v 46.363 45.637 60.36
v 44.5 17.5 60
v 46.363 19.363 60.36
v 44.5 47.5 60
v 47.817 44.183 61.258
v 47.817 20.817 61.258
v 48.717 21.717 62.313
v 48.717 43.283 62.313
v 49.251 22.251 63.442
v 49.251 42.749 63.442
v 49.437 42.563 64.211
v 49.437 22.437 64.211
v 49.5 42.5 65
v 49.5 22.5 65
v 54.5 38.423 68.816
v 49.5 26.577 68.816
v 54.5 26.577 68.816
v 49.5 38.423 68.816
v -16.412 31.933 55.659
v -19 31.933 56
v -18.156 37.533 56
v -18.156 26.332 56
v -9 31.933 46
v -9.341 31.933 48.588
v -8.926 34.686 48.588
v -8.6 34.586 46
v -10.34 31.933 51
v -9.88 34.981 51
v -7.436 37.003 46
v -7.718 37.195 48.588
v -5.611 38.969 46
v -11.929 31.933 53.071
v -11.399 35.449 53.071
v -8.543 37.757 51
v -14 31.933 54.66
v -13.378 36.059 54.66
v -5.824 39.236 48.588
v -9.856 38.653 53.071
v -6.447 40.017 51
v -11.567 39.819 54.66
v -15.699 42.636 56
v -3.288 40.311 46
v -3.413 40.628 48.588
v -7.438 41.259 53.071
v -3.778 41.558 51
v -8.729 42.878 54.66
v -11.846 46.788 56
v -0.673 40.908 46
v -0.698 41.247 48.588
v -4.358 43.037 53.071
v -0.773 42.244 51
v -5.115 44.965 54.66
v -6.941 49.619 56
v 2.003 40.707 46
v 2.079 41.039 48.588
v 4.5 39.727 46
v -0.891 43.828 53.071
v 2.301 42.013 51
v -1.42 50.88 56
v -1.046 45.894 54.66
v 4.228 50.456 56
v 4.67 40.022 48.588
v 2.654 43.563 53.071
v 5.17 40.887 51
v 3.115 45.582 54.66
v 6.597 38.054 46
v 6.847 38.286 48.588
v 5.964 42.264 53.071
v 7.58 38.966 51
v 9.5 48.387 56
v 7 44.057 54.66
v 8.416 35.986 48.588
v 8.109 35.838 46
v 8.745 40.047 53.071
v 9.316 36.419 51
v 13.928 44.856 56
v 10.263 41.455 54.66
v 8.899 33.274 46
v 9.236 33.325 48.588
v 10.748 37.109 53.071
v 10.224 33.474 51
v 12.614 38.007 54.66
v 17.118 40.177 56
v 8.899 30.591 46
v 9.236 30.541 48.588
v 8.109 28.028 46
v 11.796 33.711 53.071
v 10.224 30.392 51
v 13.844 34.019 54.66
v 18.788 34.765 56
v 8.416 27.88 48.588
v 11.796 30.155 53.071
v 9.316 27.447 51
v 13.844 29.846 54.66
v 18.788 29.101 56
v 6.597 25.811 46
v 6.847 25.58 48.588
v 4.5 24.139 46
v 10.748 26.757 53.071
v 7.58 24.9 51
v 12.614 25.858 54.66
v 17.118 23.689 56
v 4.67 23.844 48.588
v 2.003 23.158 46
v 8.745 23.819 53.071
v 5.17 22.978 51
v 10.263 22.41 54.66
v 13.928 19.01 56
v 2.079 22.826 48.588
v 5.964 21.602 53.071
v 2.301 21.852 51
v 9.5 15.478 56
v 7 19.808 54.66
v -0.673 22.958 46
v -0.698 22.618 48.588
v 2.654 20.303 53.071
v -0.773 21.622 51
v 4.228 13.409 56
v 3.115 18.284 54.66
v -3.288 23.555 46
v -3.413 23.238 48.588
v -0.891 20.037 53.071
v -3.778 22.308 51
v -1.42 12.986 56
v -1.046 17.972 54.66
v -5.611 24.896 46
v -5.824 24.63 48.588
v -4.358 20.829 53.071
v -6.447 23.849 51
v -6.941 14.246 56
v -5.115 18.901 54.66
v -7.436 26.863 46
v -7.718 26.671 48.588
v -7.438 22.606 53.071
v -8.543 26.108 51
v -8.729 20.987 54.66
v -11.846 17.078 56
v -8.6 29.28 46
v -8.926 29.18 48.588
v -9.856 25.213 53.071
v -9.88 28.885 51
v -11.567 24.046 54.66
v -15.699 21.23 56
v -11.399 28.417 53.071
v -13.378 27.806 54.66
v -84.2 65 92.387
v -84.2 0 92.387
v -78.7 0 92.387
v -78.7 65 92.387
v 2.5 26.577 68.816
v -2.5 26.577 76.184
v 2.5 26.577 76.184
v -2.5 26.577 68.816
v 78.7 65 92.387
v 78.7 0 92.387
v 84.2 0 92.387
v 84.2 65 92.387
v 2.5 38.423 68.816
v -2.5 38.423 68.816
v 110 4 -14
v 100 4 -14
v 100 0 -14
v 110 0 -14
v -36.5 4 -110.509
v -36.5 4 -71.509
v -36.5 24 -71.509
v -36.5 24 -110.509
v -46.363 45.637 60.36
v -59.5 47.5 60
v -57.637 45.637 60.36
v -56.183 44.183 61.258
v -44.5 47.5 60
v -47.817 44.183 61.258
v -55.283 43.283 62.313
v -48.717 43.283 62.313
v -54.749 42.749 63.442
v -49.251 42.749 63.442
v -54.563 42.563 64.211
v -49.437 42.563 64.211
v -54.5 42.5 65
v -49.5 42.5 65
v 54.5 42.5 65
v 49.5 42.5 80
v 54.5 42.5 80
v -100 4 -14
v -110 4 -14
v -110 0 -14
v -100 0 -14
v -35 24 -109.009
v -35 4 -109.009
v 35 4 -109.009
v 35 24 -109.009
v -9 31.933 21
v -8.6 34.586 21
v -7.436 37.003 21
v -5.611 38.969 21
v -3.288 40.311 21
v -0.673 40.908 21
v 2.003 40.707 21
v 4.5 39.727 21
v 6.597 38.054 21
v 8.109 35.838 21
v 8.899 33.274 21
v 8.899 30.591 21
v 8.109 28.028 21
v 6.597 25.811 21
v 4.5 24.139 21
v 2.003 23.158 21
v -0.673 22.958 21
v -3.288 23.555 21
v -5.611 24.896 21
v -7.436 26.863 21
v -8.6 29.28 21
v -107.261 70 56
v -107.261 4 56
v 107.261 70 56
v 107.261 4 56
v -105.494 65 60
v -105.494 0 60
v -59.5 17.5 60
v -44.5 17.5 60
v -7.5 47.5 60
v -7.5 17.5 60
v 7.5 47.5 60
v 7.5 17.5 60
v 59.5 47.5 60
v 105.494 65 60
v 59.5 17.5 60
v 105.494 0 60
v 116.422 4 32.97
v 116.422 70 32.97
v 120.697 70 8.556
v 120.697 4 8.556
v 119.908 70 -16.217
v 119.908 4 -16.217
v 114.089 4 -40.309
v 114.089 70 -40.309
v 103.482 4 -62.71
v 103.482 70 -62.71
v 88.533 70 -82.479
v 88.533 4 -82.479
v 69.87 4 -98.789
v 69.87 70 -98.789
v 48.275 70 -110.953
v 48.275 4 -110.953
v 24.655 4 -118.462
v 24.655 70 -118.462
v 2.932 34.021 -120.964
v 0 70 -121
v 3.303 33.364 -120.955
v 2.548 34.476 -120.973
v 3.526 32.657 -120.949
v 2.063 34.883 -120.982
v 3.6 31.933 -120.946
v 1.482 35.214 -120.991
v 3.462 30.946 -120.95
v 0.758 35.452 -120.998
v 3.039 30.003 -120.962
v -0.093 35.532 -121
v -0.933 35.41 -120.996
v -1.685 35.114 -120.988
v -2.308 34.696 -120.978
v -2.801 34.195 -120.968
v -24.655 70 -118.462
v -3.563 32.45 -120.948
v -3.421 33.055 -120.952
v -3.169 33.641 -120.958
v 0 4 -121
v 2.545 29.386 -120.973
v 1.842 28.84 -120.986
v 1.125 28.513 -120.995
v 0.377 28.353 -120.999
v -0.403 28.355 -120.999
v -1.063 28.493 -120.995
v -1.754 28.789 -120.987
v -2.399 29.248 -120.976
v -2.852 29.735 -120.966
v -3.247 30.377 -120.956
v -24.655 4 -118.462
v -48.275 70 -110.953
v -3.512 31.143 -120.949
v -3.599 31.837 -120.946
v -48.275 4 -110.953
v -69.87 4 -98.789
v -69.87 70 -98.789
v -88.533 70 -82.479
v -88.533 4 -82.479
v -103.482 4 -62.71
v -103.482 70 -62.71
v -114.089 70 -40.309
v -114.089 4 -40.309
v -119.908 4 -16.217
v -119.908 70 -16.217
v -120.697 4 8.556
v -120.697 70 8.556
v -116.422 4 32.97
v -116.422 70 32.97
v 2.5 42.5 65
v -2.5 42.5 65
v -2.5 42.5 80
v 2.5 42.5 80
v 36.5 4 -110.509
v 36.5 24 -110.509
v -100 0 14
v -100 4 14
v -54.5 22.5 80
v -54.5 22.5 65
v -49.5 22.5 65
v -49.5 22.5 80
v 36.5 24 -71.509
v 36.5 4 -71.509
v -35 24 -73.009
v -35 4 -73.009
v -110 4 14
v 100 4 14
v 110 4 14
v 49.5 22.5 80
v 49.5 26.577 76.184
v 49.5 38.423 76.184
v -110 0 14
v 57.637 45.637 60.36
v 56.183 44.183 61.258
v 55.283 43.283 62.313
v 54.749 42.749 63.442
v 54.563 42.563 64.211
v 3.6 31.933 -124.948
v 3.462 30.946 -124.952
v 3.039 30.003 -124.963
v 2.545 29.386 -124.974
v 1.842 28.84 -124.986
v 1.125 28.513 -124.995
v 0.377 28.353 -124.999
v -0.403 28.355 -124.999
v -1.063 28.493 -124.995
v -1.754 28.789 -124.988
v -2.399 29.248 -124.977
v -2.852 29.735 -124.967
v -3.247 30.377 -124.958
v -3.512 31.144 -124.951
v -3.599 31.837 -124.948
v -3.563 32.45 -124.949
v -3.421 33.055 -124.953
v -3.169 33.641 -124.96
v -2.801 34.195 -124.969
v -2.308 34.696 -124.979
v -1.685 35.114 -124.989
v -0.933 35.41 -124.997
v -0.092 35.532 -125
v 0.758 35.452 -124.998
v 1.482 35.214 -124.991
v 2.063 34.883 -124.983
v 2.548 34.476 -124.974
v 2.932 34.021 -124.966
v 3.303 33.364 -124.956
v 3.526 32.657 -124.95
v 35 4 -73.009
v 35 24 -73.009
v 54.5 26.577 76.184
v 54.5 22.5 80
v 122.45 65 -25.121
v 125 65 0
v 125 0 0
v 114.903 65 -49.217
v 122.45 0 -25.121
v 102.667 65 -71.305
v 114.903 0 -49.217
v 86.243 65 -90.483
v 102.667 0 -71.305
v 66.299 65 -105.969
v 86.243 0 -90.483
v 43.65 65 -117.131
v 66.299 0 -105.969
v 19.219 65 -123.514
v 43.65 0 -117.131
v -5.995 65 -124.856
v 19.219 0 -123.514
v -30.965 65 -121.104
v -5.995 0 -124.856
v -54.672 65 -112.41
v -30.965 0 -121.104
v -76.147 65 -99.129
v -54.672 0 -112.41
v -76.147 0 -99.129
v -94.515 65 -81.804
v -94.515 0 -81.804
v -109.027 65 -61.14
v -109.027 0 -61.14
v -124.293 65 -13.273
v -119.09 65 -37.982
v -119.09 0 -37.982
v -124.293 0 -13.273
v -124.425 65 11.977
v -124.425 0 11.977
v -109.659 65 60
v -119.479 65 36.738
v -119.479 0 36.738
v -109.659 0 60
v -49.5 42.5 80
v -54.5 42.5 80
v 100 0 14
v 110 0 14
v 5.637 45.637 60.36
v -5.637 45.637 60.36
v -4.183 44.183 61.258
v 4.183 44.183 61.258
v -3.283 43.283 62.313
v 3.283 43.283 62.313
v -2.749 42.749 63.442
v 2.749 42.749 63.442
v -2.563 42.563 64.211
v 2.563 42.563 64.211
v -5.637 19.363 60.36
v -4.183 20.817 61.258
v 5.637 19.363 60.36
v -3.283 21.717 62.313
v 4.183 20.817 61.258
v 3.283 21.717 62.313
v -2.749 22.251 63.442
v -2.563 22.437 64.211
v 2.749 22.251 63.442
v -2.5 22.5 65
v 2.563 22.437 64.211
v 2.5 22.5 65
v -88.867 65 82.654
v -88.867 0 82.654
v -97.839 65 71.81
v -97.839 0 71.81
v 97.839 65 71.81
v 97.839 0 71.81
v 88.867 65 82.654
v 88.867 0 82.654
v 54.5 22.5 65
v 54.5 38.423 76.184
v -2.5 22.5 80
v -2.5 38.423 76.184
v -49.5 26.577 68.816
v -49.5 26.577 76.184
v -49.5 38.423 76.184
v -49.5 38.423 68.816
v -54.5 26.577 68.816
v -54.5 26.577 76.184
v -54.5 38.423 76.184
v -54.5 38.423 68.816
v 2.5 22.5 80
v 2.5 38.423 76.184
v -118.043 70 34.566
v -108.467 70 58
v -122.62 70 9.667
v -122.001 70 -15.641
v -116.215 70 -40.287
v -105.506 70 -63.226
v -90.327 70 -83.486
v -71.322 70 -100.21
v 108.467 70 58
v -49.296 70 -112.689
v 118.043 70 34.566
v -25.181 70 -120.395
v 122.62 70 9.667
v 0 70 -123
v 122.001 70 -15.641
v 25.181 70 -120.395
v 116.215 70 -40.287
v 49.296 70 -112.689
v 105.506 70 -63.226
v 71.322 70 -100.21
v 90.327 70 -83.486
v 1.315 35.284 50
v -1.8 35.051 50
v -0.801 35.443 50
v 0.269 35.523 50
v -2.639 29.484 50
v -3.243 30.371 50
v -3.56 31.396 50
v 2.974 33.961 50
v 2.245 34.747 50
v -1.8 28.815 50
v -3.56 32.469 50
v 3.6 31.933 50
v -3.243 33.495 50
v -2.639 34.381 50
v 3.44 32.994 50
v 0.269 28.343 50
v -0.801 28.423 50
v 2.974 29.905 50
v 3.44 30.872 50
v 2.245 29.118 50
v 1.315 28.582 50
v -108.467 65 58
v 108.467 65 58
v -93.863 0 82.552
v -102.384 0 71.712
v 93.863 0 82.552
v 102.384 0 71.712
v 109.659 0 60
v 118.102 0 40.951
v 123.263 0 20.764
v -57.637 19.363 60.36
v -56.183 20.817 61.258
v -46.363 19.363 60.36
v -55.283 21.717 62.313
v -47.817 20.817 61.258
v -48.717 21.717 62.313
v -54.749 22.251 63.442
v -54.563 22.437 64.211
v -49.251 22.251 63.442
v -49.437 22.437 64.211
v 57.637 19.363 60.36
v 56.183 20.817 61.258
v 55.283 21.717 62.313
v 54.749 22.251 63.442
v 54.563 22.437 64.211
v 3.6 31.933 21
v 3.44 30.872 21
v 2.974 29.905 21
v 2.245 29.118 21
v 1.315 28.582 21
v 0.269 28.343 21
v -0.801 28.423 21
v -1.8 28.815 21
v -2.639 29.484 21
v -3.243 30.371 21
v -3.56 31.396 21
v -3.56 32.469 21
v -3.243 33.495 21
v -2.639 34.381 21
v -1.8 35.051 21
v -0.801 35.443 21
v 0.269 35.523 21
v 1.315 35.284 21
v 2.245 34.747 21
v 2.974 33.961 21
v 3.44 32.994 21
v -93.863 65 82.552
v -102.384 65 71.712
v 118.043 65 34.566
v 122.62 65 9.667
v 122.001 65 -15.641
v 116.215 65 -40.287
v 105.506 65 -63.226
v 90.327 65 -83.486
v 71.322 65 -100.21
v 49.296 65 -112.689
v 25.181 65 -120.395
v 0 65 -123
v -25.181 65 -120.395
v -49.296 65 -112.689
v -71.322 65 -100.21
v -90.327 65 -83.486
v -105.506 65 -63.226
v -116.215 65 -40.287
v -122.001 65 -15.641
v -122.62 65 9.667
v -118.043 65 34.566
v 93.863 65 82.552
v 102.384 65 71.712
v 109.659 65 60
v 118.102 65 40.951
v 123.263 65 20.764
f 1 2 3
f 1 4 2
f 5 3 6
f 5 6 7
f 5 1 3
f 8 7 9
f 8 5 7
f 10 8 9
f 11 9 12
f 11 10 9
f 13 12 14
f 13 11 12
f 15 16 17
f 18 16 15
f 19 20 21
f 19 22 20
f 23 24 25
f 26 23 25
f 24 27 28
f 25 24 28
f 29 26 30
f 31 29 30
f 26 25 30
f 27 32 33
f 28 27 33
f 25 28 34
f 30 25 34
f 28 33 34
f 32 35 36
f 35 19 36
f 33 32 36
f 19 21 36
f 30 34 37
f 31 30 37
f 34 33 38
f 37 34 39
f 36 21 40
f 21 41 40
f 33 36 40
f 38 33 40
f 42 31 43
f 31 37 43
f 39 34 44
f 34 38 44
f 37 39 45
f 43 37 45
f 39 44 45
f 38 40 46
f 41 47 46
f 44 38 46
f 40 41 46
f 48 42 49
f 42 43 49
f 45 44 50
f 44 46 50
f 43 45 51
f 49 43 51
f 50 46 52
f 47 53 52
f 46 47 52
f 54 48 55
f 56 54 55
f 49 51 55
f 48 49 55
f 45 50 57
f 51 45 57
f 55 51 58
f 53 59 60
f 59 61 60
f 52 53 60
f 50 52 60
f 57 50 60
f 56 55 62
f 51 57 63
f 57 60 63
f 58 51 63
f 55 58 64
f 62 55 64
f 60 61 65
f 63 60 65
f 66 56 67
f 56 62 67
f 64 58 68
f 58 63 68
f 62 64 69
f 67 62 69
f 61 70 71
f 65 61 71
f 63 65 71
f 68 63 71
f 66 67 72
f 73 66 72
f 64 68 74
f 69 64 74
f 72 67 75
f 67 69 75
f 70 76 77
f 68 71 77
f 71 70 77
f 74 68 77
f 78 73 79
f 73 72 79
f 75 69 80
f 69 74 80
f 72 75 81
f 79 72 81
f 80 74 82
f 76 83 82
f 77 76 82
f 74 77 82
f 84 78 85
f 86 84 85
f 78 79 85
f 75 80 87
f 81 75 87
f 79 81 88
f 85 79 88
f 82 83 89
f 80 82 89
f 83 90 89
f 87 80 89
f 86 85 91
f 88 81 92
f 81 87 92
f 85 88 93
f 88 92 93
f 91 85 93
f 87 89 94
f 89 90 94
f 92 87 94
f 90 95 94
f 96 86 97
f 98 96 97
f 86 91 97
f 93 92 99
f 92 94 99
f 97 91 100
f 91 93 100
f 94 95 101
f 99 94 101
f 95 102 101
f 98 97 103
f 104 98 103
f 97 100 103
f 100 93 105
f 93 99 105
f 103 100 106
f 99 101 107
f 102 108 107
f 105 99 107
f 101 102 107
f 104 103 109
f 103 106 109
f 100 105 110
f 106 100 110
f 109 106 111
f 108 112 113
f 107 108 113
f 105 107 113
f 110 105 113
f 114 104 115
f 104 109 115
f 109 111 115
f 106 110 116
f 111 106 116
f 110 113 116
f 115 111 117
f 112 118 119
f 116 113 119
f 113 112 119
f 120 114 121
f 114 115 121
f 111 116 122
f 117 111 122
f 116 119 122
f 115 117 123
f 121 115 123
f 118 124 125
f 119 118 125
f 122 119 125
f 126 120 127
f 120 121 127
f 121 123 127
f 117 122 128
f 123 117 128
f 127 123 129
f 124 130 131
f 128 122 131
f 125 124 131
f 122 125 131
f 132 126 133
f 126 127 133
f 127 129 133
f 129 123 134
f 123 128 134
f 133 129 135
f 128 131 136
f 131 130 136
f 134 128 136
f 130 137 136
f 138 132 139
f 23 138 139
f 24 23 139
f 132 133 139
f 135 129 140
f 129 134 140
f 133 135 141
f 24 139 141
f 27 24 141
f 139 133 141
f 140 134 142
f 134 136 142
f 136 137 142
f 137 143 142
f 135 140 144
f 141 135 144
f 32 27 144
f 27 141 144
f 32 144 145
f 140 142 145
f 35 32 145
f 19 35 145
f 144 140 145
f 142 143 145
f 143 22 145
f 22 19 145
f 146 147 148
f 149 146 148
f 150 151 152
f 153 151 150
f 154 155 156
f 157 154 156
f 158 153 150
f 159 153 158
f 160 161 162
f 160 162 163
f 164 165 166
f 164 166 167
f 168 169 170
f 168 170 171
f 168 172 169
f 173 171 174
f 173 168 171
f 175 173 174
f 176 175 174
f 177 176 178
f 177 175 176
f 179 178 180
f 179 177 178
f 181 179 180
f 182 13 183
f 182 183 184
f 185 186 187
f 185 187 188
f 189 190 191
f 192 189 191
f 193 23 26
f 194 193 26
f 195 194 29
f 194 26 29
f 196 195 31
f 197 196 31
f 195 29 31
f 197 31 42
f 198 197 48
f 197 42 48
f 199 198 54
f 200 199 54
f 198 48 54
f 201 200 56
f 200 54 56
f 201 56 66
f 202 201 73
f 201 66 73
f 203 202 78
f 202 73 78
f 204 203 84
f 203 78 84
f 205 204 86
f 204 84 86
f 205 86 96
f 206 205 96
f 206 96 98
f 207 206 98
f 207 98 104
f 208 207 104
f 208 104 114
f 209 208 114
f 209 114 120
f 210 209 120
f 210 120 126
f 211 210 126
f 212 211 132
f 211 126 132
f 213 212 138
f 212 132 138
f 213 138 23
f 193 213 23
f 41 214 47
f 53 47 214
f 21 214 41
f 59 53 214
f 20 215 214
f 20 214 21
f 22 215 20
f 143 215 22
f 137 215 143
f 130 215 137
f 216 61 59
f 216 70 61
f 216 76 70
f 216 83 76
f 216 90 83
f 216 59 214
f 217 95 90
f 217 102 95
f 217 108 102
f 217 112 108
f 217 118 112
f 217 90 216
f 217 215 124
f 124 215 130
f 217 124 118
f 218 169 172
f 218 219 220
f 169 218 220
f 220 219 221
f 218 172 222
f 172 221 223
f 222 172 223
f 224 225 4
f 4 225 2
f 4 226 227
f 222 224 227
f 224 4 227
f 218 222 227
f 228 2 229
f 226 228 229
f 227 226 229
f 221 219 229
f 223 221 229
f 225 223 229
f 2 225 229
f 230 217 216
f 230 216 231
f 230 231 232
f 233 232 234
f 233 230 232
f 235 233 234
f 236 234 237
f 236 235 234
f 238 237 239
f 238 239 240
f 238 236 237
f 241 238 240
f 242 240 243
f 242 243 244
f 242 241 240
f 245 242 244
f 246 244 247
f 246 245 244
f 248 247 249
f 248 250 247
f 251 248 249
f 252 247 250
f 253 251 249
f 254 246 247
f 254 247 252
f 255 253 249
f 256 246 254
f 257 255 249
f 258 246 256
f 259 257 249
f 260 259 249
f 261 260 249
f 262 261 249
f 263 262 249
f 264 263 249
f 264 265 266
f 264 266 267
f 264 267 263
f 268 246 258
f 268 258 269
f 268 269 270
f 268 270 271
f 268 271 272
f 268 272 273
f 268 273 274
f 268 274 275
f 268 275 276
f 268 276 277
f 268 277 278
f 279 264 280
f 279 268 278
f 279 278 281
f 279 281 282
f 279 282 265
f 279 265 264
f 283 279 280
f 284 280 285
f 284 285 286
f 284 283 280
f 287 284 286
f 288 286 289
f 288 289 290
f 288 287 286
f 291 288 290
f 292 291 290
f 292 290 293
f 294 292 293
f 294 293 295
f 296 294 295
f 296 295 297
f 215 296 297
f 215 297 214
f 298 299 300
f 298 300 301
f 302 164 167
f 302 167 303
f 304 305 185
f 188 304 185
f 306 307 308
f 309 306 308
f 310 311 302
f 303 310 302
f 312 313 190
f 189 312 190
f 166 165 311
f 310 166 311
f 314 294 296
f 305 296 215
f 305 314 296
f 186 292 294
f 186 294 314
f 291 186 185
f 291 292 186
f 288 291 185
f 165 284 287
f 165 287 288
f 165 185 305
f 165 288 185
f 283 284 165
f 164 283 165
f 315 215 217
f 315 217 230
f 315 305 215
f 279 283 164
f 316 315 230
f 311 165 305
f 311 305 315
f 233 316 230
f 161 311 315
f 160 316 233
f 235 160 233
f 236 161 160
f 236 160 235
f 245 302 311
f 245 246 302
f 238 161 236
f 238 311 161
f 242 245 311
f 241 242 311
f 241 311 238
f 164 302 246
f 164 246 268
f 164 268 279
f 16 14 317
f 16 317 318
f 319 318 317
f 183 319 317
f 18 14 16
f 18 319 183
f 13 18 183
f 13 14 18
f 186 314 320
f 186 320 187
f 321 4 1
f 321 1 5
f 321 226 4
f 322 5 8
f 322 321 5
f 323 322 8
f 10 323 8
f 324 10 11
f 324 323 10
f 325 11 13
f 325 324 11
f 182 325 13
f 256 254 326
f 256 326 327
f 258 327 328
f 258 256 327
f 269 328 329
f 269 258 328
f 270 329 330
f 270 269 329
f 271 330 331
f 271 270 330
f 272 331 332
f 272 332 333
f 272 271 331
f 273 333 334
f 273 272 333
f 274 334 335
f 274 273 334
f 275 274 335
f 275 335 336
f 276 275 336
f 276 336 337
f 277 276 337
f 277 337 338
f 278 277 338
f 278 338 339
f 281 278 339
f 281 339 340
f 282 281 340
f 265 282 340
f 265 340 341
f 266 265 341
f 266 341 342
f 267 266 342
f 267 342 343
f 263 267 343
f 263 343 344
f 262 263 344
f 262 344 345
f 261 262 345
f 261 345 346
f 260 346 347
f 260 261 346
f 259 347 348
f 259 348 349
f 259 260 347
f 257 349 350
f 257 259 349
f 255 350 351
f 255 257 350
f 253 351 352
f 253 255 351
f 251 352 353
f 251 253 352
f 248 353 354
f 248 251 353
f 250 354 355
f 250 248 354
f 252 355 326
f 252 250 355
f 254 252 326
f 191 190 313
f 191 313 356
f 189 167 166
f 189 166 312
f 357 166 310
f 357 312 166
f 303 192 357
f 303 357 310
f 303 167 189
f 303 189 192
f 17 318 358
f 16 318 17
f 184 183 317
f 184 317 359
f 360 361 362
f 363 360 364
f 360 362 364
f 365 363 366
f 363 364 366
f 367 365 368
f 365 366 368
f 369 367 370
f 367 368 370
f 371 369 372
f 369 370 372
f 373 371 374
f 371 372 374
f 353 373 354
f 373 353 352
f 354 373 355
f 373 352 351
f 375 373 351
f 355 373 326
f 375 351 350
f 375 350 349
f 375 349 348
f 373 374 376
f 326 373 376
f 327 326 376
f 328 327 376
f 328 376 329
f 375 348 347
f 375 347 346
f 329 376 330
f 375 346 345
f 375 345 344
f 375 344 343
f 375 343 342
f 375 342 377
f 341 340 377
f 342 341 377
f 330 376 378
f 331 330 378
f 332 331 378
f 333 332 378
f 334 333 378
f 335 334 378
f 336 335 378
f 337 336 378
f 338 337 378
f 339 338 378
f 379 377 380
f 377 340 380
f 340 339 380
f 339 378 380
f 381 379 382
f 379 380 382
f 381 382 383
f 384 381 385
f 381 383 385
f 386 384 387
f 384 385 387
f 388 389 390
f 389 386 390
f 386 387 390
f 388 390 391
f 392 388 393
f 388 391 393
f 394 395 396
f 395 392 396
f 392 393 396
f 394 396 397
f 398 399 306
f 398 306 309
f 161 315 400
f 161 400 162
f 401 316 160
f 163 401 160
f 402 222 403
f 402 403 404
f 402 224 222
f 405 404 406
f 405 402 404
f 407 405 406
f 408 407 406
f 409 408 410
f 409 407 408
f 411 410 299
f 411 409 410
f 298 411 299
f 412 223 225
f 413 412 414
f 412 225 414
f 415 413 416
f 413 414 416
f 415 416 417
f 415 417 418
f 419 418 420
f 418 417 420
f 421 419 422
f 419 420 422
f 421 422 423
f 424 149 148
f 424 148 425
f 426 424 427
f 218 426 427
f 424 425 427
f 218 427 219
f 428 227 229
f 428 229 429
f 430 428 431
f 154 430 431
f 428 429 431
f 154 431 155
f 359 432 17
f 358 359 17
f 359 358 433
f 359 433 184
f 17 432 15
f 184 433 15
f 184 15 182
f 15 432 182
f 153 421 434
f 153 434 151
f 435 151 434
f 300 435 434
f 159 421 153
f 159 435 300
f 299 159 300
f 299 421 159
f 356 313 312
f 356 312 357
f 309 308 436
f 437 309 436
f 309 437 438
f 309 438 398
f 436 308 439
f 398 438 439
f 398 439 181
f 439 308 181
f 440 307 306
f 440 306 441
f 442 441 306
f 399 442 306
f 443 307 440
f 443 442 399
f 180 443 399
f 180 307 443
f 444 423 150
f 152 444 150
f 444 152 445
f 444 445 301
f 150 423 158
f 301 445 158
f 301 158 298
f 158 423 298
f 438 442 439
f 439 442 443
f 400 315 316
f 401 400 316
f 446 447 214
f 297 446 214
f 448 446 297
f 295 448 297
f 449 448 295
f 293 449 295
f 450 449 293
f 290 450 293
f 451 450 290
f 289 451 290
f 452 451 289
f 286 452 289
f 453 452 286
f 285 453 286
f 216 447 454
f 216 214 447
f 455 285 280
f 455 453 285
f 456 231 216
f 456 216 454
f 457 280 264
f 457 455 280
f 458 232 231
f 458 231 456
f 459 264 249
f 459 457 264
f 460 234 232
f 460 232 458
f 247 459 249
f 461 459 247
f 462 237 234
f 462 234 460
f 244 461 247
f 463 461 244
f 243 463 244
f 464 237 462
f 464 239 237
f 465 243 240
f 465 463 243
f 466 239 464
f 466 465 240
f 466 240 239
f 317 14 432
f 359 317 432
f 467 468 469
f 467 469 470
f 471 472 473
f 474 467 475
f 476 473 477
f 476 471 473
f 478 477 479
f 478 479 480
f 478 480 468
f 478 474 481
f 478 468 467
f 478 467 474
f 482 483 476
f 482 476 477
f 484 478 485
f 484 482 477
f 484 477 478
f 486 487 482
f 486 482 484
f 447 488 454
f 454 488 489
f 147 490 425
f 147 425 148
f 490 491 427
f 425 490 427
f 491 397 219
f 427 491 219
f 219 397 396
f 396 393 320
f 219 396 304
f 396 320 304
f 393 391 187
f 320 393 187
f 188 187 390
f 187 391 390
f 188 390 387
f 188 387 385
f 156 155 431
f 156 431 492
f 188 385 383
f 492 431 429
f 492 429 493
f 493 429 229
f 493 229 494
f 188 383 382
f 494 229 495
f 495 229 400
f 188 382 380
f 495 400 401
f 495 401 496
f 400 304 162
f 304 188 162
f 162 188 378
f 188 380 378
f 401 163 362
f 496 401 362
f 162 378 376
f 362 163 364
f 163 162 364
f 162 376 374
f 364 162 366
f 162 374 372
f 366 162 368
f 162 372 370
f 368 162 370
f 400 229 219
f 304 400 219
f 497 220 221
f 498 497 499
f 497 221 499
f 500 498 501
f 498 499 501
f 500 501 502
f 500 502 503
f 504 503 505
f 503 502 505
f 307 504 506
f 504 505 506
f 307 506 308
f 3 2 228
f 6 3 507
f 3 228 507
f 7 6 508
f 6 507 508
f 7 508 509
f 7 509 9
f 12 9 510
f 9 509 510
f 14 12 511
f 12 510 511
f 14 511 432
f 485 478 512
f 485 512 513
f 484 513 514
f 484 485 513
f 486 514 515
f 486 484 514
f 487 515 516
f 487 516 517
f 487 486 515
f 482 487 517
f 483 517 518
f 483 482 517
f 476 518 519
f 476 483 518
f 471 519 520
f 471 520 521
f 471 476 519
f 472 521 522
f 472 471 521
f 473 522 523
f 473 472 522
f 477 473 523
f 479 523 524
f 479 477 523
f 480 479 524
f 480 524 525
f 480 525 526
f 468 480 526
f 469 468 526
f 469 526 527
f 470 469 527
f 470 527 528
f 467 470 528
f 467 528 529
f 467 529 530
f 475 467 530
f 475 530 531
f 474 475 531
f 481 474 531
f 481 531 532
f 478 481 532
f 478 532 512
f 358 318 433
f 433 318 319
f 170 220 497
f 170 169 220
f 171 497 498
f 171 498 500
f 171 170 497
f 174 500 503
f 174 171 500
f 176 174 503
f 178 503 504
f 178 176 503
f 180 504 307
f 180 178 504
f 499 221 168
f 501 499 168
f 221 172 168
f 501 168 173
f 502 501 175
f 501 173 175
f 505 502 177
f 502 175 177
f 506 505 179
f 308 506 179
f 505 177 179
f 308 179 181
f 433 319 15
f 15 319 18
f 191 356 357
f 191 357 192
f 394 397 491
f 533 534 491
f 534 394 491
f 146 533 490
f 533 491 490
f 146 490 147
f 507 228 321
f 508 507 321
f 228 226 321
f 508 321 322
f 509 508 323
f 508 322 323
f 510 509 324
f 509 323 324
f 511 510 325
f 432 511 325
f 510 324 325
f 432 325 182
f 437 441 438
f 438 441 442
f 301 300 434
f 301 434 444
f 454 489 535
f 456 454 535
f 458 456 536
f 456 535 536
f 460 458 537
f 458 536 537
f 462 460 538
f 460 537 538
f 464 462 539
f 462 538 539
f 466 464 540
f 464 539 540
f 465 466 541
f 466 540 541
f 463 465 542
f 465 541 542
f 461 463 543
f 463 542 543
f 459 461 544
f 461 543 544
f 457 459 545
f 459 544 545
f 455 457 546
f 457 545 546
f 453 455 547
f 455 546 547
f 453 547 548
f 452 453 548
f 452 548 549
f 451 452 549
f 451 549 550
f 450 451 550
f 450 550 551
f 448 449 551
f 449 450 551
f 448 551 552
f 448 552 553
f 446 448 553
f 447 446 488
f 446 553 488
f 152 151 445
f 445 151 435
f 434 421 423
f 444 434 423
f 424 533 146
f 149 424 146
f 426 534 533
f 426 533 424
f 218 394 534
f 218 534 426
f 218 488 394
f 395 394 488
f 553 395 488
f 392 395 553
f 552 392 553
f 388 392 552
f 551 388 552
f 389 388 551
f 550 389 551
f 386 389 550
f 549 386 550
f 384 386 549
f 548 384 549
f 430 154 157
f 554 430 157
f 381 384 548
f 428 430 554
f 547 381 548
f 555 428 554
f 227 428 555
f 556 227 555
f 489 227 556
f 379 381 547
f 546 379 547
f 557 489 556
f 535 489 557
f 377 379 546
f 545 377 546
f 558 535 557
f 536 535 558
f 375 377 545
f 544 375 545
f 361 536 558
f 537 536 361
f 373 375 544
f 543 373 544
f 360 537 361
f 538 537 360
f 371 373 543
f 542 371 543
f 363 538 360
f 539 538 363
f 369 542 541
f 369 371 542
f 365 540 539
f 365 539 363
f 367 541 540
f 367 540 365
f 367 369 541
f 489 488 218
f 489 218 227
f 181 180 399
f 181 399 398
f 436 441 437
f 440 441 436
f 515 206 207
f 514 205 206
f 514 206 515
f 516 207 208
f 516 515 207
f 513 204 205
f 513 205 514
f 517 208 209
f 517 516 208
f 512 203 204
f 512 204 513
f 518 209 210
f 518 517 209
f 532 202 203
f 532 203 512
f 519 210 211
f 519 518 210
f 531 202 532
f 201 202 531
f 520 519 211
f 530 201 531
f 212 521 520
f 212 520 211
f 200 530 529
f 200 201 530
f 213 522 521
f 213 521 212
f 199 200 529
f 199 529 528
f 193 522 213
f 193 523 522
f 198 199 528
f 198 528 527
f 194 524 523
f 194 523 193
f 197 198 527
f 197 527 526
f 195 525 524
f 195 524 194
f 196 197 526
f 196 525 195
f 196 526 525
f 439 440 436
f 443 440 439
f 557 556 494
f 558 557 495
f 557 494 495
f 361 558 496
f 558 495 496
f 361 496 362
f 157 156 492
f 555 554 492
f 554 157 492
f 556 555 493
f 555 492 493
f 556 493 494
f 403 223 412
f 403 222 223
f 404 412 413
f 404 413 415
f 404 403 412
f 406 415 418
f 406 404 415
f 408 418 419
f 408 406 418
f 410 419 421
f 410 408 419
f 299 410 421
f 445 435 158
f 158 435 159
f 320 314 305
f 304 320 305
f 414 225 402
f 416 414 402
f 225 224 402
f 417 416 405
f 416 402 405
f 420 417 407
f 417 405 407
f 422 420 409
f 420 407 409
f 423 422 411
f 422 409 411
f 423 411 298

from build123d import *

# Parameters (mm, degrees)
RESSALTO_EXTRUS_O1_DEPTH   = 70
RESSALTO_EXTRUS_O4_START   = -70
RESSALTO_EXTRUS_O4_DEPTH   = 70
CASCA1_START               = 4
CASCA1_DEPTH               = 66
ESBO_O17_W                 = 10
ESBO_O17_H                 = 28
CORTE_EXTRUS_O2_DEPTH      = 10
CORTE_EXTRUS_O6_DEPTH      = 4
CORTE_EXTRUS_O6_DEPTH_BACK = 5
ESBO_O23_OUTSIDE_W         = 319.722
ESBO_O23_OUTSIDE_H         = 287.109
ESBO_O27_W                 = 5
ESBO_O27_H                 = 20
RESSALTO_EXTRUS_O5_DEPTH   = 20
FILETE2_R                  = 5
CORTE_EXTRUS_O7_DEPTH      = 104
CORTE_EXTRUS_O7_DEPTH_BACK = 5
ESBO_O28_W                 = 7.367994206
ESBO_O28_H                 = 11.845430552
ESBO_O32_R                 = 3.6
CORTE_EXTRUS_O8_DEPTH      = 187
ESBO_O32_3_R               = 9
ESBO_O32_3_R_2             = 3.6
RESSALTO_EXTRUS_O6_DEPTH   = 35
ESBO_O32_4_R               = 3.6
RESSALTO_EXTRUS_O7_DEPTH   = 6
FILETE3_R                  = 10
ESBO_O24_W                 = 73
ESBO_O24_H                 = 39
ESBO_O24_W_2               = 70
ESBO_O24_H_2               = 36
RESSALTO_EXTRUS_O8_DEPTH   = 20


# Read off the part's stored shape, not the designer's step: Casca1
with BuildPart() as part:
    # Esboço1 → Ressalto-extrusão1 (new body)
    with BuildSketch(Plane(origin=(0, 0, 0), x_dir=(1, 0, 0), z_dir=(0, 1, 0))):
        with BuildLine():
            ThreePointArc((125, 0), (-30.965140685, 121.103922572), (-109.658560997, -60))
            Line((-109.658560997, -60), (109.658560997, -60))
            ThreePointArc((109.658560997, -60), (121.103922572, -30.965140685), (125, 0))
        make_face()
    extrude(amount=RESSALTO_EXTRUS_O1_DEPTH)

    # Esboço5 → Ressalto-extrusão4 (add)
    with BuildSketch(Plane(origin=(0, 70, 0), x_dir=(1, 0, 0), z_dir=(0, 1, 0)).offset(RESSALTO_EXTRUS_O4_START)):
        with BuildLine():
            Line((-84.200220254, -92.386811338), (-78.700220254, -92.386811338))
            ThreePointArc((-78.700220254, -92.386811338), (-93.51006265, -77.362237302), (-105.49430116, -60))
            Line((-105.49430116, -60), (-109.658560997, -60))
            ThreePointArc((-109.658560997, -60), (-98.272748787, -77.249380877), (-84.200220254, -92.386811338))
        make_face()
        with BuildLine():
            Line((78.700220254, -92.386811338), (84.200220254, -92.386811338))
            ThreePointArc((84.200220254, -92.386811338), (98.272748787, -77.249380877), (109.658560997, -60))
            Line((109.658560997, -60), (105.49430116, -60))
            ThreePointArc((105.49430116, -60), (93.51006265, -77.362237302), (78.700220254, -92.386811338))
        make_face()
    extrude(amount=RESSALTO_EXTRUS_O4_DEPTH)

    # Casca1 outline → Casca1 (cut)
    with BuildSketch(Plane(origin=(0, 0, 0), x_dir=(1, 0, 0), z_dir=(0, 1, 0)).offset(CASCA1_START)):
        with BuildLine():
            Line((-107.261363034, -56), (107.261363034, -56))
            ThreePointArc((107.261363034, -56), (0, 121), (-107.261363034, -56))
        make_face()
    extrude(amount=CASCA1_DEPTH, mode=Mode.SUBTRACT)

    # Esboço17 → Corte-extrusão2 (cut)
    with BuildSketch(Plane(origin=(0, 4, 0), x_dir=(1, 0, 0), z_dir=(0, 1, 0))):
        with Locations((-105, 0)):
            Rectangle(ESBO_O17_W, ESBO_O17_H)
        with Locations((105, 0)):
            Rectangle(ESBO_O17_W, ESBO_O17_H)
    extrude(amount=-CORTE_EXTRUS_O2_DEPTH, mode=Mode.SUBTRACT)

    # Esboço23 outside → Corte-extrusão6 (cut, two sides: drawn at the far end of the back side and taken through both)
    with BuildSketch(Plane(origin=(0, 70, 0), x_dir=(1, 0, 0), z_dir=(0, 1, 0)).offset(-CORTE_EXTRUS_O6_DEPTH_BACK)):
        with Locations((0, 16.3065)):
            Rectangle(ESBO_O23_OUTSIDE_W, ESBO_O23_OUTSIDE_H)
        with BuildLine():
            Line((-108.466584716, -58), (108.466584716, -58))
            ThreePointArc((108.466584716, -58), (0, 123), (-108.466584716, -58))
        make_face(mode=Mode.SUBTRACT)
    extrude(amount=CORTE_EXTRUS_O6_DEPTH + CORTE_EXTRUS_O6_DEPTH_BACK, mode=Mode.SUBTRACT)

    # Esboço27 → Ressalto-extrusão5 (add)
    with BuildSketch(Plane.XY.offset(60)):
        with Locations((-52, 32.5)):
            Rectangle(ESBO_O27_W, ESBO_O27_H)
        with Locations((52, 32.5)):
            Rectangle(ESBO_O27_W, ESBO_O27_H)
        with Locations((0, 32.5)):
            Rectangle(ESBO_O27_W, ESBO_O27_H)
    extrude(amount=RESSALTO_EXTRUS_O5_DEPTH)

    # Filete2
    filete2_edges = [part.edges().sort_by_distance(p)[0] for p in [
        (-54.5, 32.5, 60),
        (-52, 22.5, 60),
        (-49.5, 32.5, 60),
        (-52, 42.5, 60),
        (49.5, 32.5, 60),
        (52, 22.5, 60),
        (54.5, 32.5, 60),
        (52, 42.5, 60),
        (-2.5, 32.5, 60),
        (0, 22.5, 60),
        (2.5, 32.5, 60),
        (0, 42.5, 60),
    ]]
    fillet(filete2_edges, radius=FILETE2_R)

    # Esboço28 → Corte-extrusão7 (cut, two sides: drawn at the far end of the back side and taken through both)
    with BuildSketch(Plane(origin=(-49.5, 0, 0), x_dir=(0, 0, -1), z_dir=(1, 0, 0)).offset(-CORTE_EXTRUS_O7_DEPTH_BACK)):
        with Locations((-72.5, 32.5)):
            Rectangle(ESBO_O28_W, ESBO_O28_H)
    extrude(amount=CORTE_EXTRUS_O7_DEPTH + CORTE_EXTRUS_O7_DEPTH_BACK, mode=Mode.SUBTRACT)

    # Esboço32 → Corte-extrusão8 (cut)
    with BuildSketch(Plane(origin=(0, 0, 56), x_dir=(-1, 0, 0), z_dir=(0, 0, -1))):
        with Locations(Location((0, 31.932833776, 0), (0, 0, 180))):
            Circle(ESBO_O32_R)
    extrude(amount=CORTE_EXTRUS_O8_DEPTH, mode=Mode.SUBTRACT)

    # Esboço32<3> → Ressalto-extrusão6 (add)
    with BuildSketch(Plane(origin=(0, 0, 56), x_dir=(-1, 0, 0), z_dir=(0, 0, -1))):
        with Locations((0, 31.932833776)):
            Circle(ESBO_O32_3_R)
        with Locations(Location((0, 31.932833776, 0), (0, 0, 180))):
            Circle(ESBO_O32_3_R_2, mode=Mode.SUBTRACT)
    extrude(amount=RESSALTO_EXTRUS_O6_DEPTH)

    # Esboço32<4> → Ressalto-extrusão7 (add)
    with BuildSketch(Plane(origin=(0, 0, 56), x_dir=(-1, 0, 0), z_dir=(0, 0, -1))):
        with Locations(Location((0, 31.932833776, 0), (0, 0, 180))):
            Circle(ESBO_O32_4_R)
    extrude(amount=RESSALTO_EXTRUS_O7_DEPTH)

    # Filete3
    filete3_edges = [part.edges().sort_by_distance(p)[0] for p in [
        (9, 31.932833776, 56),
    ]]
    fillet(filete3_edges, radius=FILETE3_R)

    # Esboço24 → Ressalto-extrusão8 (add)
    with BuildSketch(Plane(origin=(0, 4, 0), x_dir=(1, 0, 0), z_dir=(0, 1, 0))):
        with Locations((0, 91.008746076)):
            Rectangle(ESBO_O24_W, ESBO_O24_H)
        with Locations((0, 91.008746076)):
            Rectangle(ESBO_O24_W_2, ESBO_O24_H_2, mode=Mode.SUBTRACT)
    extrude(amount=RESSALTO_EXTRUS_O8_DEPTH)


solid = part.part
